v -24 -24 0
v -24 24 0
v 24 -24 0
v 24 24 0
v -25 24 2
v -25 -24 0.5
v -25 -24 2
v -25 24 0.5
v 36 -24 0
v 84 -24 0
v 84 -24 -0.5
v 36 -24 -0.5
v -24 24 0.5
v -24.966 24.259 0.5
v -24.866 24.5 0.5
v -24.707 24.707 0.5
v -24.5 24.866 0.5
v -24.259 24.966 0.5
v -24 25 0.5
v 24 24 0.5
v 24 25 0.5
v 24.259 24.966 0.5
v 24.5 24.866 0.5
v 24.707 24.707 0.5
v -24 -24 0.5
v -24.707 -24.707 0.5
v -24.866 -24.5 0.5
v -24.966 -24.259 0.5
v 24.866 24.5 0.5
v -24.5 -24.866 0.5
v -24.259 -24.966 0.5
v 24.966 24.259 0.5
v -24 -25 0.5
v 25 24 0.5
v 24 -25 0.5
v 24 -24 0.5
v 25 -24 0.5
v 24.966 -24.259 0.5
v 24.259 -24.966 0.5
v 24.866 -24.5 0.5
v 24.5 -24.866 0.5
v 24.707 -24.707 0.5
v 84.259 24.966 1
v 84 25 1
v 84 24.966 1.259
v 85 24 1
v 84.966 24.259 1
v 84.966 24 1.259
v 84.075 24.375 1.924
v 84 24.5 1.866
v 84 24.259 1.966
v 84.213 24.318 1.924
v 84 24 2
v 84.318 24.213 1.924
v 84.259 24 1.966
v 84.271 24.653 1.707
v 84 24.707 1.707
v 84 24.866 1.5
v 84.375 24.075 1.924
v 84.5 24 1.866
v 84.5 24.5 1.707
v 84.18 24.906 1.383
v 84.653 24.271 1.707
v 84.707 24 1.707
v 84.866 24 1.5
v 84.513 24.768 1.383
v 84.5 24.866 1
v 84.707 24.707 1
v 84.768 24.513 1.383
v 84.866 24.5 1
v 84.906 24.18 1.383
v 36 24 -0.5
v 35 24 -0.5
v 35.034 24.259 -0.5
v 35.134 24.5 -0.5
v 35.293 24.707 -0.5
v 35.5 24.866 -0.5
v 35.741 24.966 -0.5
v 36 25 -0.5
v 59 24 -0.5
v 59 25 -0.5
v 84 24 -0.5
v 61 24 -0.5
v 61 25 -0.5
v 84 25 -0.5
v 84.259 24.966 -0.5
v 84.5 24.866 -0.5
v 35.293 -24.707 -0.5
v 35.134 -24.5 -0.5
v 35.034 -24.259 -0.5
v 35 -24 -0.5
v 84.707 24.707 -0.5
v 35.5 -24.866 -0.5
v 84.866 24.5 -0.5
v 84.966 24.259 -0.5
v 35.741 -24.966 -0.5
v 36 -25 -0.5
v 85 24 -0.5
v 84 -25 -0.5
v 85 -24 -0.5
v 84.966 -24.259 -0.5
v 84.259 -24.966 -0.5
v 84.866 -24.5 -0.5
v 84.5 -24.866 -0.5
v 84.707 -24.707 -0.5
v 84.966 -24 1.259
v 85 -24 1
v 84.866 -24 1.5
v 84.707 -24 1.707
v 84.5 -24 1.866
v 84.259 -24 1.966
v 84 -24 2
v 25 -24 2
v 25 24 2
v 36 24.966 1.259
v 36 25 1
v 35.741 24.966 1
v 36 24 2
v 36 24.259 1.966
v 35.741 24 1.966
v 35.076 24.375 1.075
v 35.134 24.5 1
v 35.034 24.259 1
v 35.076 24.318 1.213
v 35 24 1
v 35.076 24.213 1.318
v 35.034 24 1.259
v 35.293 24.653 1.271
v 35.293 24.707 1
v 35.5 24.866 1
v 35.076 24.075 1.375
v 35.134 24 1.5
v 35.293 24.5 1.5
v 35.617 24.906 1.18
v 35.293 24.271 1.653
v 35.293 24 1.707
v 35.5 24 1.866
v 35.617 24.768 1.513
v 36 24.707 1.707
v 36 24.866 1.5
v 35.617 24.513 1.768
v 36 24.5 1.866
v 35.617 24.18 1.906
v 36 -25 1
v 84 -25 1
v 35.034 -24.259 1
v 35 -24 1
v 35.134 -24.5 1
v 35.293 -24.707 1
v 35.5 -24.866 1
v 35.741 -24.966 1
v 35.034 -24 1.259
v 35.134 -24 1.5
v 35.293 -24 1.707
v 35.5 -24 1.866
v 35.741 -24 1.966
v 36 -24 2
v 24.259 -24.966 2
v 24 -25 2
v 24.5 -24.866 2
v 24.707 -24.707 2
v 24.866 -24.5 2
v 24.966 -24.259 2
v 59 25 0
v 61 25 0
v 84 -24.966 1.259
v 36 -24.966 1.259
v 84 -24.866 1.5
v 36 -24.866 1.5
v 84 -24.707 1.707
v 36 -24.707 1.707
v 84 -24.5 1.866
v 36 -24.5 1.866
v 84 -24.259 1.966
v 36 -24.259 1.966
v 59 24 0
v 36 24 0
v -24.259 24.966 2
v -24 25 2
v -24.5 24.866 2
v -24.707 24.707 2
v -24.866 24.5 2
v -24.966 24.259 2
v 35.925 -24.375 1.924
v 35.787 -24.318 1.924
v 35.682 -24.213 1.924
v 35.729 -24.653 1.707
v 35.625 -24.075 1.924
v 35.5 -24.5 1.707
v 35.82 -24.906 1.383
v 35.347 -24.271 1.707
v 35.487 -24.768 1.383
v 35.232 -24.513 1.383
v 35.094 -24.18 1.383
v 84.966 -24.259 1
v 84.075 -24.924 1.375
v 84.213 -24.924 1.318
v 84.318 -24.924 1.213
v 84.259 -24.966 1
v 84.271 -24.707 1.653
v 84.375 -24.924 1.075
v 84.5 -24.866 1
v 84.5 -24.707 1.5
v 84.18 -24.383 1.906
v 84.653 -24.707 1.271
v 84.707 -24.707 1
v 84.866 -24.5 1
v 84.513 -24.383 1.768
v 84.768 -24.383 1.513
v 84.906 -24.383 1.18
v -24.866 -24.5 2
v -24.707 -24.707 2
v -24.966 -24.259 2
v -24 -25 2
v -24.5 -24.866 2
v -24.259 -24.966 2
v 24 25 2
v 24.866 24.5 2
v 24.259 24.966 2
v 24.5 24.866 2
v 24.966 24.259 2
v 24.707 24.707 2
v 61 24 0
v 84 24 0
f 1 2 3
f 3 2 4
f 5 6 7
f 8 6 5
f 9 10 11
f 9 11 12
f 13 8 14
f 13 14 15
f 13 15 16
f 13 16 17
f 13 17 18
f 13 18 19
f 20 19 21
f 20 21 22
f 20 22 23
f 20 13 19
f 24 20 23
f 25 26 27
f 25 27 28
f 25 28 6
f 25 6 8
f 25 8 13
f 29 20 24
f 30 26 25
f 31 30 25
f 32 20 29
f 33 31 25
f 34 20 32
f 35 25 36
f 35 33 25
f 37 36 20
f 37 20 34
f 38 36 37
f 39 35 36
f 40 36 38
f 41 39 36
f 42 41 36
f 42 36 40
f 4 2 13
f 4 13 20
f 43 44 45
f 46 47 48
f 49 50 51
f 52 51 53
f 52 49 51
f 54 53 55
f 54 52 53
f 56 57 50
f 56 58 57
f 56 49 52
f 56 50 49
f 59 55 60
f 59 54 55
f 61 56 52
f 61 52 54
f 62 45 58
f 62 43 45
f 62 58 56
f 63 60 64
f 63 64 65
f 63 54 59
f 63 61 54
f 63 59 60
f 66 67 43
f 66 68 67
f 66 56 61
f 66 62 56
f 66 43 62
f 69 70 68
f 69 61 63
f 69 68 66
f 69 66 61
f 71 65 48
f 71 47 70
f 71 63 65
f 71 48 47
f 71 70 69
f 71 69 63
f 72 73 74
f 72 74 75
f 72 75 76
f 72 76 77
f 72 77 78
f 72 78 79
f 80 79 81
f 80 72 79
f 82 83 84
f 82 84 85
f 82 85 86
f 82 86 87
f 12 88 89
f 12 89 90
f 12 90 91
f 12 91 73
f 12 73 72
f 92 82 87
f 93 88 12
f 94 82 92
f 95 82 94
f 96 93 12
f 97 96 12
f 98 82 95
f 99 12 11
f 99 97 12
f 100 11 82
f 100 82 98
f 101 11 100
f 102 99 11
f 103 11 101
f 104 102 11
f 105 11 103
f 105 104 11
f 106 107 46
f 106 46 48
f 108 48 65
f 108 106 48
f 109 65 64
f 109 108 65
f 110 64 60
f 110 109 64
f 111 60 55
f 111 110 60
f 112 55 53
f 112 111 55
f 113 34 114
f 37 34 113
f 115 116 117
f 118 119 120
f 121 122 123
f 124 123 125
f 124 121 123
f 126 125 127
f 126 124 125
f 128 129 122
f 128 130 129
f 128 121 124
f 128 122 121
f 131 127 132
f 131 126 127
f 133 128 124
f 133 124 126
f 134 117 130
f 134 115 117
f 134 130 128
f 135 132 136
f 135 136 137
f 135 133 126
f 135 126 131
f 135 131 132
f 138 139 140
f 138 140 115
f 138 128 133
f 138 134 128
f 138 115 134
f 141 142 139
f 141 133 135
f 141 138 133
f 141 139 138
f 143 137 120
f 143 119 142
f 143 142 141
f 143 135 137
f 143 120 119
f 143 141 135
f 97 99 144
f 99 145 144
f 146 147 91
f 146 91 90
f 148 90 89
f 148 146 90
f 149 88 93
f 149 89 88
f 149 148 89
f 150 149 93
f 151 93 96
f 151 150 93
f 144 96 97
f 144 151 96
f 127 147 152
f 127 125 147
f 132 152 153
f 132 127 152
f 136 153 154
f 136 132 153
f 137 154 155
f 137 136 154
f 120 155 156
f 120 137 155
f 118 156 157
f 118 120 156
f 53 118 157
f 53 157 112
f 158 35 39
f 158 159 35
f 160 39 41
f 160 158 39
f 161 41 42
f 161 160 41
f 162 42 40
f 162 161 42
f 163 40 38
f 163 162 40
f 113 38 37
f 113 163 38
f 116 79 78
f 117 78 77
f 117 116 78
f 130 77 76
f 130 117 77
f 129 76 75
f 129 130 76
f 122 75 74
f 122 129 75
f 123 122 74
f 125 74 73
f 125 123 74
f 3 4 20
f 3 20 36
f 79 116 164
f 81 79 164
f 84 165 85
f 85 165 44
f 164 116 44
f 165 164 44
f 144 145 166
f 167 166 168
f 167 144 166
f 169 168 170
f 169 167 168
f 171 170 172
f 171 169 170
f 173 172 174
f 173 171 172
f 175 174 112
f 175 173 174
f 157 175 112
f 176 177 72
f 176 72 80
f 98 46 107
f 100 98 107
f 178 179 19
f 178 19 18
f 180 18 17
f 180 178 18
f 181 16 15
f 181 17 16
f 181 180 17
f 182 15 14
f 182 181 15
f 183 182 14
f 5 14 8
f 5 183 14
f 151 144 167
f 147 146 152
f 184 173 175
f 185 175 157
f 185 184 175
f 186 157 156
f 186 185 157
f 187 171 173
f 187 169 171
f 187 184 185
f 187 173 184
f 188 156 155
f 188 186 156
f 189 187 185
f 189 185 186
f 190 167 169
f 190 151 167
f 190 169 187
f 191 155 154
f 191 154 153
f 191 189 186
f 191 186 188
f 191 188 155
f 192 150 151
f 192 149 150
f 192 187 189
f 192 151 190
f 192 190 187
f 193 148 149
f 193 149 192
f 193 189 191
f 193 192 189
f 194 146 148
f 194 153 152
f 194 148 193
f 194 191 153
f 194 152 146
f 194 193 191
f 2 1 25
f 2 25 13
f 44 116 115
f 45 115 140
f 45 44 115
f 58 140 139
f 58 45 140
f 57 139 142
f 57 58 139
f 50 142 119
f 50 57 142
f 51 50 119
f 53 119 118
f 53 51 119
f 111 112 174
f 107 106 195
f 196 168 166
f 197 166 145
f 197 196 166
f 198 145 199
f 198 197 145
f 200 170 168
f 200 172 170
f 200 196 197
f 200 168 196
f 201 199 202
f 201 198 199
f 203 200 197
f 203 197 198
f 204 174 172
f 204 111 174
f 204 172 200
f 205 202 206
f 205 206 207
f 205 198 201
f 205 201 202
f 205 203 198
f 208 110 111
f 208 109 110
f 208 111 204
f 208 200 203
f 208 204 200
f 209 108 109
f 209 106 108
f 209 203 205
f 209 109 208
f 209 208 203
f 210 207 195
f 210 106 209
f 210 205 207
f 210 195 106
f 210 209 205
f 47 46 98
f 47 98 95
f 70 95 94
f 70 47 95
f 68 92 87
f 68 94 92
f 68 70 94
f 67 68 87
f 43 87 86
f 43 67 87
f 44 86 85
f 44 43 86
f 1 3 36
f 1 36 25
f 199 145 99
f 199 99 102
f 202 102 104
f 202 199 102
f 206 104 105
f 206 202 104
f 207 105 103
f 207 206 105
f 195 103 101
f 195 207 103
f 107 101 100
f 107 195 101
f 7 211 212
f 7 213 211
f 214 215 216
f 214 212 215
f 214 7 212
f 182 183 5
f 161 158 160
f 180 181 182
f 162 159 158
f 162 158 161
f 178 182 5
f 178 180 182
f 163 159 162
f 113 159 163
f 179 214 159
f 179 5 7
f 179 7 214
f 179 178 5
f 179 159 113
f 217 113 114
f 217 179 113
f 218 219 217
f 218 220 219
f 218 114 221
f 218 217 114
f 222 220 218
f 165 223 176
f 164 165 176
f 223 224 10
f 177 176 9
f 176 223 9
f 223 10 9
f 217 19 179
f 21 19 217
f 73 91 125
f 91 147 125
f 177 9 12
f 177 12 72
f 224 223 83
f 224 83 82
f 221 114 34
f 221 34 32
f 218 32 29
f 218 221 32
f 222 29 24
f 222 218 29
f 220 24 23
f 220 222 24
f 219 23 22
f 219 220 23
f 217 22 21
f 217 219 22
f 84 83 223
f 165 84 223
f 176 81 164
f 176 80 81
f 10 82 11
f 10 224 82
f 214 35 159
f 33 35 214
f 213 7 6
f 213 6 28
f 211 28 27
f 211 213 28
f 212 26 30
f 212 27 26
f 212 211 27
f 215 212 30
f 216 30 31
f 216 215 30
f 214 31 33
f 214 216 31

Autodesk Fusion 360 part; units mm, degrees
sketch "Sketch1" plane through (0, 0, 0) normal (0, 0, 1) x (1, 0, 0)
  line L0 (25, -25) -> (-25, -25)
  line L1 (-25, -25) -> (-25, 25)
  line L2 (-25, 25) -> (25, 25)
  line L3 (25, 25) -> (25, -25)
  line L4 (25, -25) -> (-25, 25) construction
  line L5 (-25, -25) -> (25, 25) construction
  line L6 (85, -25) -> (35, -25)
  line L7 (35, -25) -> (35, 25)
  line L8 (85, -25) -> (35, 25) construction
  line L9 (35, 25) -> (85, 25)
  line L10 (35, -25) -> (85, 25) construction
  line L11 (85, 25) -> (85, -25)
  point P0 (60, 0)
  point P1 (60, 0)
  dimension "d1" = 50
  dimension "d2" = 50
  dimension "d3" = 50
  dimension "d4" = 50
extrude "Extrude1" add sketch "Sketch1" along normal blind 2 makes body 1 at (8.3333, -8.3333, 0) makes body 2 at (68.3333, -8.3333, 0)
fillet "Fillet1" radius 1 12 edges at (25, 25, 1) (25, -25, 1) (-25, -25, 1) (-25, 25, 1) (85, 25, 1) (60, 25, 2) (85, 0, 2) (35, -25, 1) (60, -25, 2) (85, -25, 1) (35, 0, 2) (35, 25, 1) on bodies 1 2
sketch "Sketch2" plane through (0, 0, 0) normal (0, 0, -1) x (1, 0, 0)
  arc A0 (-25, -24) -> (-24, -25) centre (-24, -24) ccw
  line L0 (-24, -25) -> (24, -25)
  arc A1 (24, -25) -> (25, -24) centre (24, -24) ccw
  line L1 (25, -24) -> (25, 24)
  arc A2 (25, 24) -> (24, 25) centre (24, 24) ccw
  line L2 (24, 25) -> (-24, 25)
  arc A3 (-24, 25) -> (-25, 24) centre (-24, 24) ccw
  line L3 (-25, 24) -> (-25, -24)
  line L4 (-24, -24) -> (24, -24)
  line L5 (24, -24) -> (24, 24)
  line L6 (24, 24) -> (-24, 24)
  line L7 (-24, 24) -> (-24, -24)
  dimension "d9" = -1
extrude "Extrude2" cut sketch "Sketch2" against normal blind 0.5 bodies 1
sketch "Sketch3" plane through (0, 0, 0) normal (0, 0, -1) x (1, 0, 0)
  arc A0 (36, 25) -> (35, 24) centre (36, 24) ccw
  line L0 (35, 24) -> (35, -24)
  arc A1 (35, -24) -> (36, -25) centre (36, -24) ccw
  line L1 (36, -25) -> (84, -25)
  arc A2 (84, -25) -> (85, -24) centre (84, -24) ccw
  line L2 (85, -24) -> (85, 24)
  arc A3 (85, 24) -> (84, 25) centre (84, 24) ccw
  line L3 (84, 25) -> (36, 25)
  line L4 (36, -24) -> (84, -24)
  line L5 (84, -24) -> (84, 24)
  line L6 (84, 24) -> (36, 24)
  line L7 (36, 24) -> (36, -24)
  dimension "d12" = -1
extrude "Extrude3" add sketch "Sketch3" along normal blind 0.5 bodies 2
sketch "Sketch4" plane through (0, 24, 0) normal (0, -1, 0) x (1, 0, 0)
  line L0 (84, 0) -> (36, 0)
  line L1 (36, 0) -> (36, -0.5)
  line L2 (36, -0.5) -> (84, -0.5)
  line L3 (84, -0.5) -> (84, 0)
  line L4 (84, -0.5) -> (60, -0.5)
  line L5 (60, -0.5) -> (61, -0.5)
  line L6 (61, -0.5) -> (61, 0)
  line L7 (61, 0) -> (60, 0)
  line L8 (60, 0) -> (60, -0.5)
  line L9 (60, -0.5) -> (59, -0.5)
  line L10 (59, -0.5) -> (59, 0)
  line L11 (59, 0) -> (60, 0)
  line L12 (60, 0) -> (60, -0.5)
extrude "Extrude4" cut sketch "Sketch4" against normal up to surface (1 mm away) contours L0 L2 L4 L5 L6 L7 L8 L12 | L0 L2 L8 L9 L10 L11 L12 bodies 2
